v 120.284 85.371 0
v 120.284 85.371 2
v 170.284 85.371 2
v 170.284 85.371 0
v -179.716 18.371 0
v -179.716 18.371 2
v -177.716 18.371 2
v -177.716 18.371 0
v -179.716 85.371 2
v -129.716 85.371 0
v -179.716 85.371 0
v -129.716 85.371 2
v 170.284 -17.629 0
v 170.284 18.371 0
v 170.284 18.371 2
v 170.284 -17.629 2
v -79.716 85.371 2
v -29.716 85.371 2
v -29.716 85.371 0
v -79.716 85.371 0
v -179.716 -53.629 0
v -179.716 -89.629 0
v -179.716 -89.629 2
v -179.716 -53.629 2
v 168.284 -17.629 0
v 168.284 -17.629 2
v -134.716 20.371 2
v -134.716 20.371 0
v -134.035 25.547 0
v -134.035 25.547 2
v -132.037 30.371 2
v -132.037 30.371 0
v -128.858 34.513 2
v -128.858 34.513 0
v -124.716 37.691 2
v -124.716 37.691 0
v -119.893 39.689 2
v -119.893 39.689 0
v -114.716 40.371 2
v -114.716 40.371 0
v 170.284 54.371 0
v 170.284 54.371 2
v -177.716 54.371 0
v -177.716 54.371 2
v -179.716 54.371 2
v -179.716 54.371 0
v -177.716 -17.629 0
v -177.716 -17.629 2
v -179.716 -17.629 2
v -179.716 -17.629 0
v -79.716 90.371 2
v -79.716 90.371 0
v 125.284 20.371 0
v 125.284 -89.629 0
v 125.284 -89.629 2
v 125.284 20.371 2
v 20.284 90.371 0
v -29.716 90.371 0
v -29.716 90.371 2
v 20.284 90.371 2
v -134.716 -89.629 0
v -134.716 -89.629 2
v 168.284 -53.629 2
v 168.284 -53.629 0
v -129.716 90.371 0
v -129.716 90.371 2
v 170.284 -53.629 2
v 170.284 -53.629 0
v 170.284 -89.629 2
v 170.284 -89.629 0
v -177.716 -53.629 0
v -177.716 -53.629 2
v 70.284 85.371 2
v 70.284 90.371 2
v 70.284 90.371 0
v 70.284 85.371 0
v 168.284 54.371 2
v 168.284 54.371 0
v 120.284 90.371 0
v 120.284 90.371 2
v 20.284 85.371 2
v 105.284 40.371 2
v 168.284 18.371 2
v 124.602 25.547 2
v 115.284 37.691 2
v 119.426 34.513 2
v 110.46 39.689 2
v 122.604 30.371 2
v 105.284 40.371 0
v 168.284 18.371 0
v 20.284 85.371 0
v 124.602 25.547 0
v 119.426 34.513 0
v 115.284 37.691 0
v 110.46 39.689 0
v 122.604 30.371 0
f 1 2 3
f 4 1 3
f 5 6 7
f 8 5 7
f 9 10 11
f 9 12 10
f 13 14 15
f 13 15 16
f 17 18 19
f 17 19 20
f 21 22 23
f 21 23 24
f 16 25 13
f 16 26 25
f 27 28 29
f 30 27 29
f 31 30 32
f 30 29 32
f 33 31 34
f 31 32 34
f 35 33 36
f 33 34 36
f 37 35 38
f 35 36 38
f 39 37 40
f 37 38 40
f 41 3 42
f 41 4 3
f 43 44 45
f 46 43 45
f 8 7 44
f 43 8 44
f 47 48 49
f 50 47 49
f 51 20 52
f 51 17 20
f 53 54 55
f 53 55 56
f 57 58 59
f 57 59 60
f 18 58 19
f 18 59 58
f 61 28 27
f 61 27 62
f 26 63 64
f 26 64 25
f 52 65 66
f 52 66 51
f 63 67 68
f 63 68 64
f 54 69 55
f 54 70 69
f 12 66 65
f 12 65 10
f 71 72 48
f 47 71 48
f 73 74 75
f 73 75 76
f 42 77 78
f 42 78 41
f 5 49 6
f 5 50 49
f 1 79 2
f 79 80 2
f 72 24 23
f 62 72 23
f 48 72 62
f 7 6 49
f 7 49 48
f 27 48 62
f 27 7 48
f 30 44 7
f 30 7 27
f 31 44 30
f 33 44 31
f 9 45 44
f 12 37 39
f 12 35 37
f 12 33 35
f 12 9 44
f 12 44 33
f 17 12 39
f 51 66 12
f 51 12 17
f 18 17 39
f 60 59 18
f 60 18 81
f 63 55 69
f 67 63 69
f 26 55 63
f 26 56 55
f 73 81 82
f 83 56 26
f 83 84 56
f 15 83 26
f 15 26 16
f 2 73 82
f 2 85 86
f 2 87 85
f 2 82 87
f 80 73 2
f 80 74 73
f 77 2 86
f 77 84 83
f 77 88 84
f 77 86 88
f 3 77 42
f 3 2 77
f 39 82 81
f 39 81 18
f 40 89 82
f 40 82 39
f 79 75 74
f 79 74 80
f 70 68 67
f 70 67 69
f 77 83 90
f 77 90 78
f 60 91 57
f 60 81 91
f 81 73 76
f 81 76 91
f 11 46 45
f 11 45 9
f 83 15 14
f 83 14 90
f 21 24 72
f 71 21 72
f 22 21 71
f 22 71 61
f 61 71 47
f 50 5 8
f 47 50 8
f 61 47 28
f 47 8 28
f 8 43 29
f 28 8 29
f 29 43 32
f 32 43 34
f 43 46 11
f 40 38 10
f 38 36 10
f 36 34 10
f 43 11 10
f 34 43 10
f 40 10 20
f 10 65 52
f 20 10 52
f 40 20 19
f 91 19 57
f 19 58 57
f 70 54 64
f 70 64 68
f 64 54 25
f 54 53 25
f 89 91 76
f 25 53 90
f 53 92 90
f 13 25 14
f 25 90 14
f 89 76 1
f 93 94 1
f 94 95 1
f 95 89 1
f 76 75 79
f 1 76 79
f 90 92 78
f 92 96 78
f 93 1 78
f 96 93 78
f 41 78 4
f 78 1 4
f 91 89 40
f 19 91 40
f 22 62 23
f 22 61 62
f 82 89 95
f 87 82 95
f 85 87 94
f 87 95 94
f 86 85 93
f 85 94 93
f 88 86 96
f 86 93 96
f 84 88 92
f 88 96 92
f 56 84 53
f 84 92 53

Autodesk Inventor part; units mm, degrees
ref_plane "YZ Plane" through (0, 0, 0) normal (1, 0, 0) x (0, 1, 0)
ref_plane "XZ Plane" through (0, 0, 0) normal (0, 1, 0) x (-1, 0, 0)
ref_plane "XY Plane" through (0, 0, 0) normal (0, 0, 1) x (1, 0, 0)
sketch "Sketch1" plane through (0, 0, 0) normal (0, 0, 1) x (1, 0, 0)
  line L0 (-179.7163, 90.3709) -> (170.2837, 90.3709)
  line L1 (170.2837, 90.3709) -> (170.2837, -89.6291)
  line L2 (-179.7163, -89.6291) -> (-179.7163, 90.3709)
  line L3 (125.2837, -89.6291) -> (125.2837, 20.3709)
  line L4 (105.2837, 40.3709) -> (-114.7163, 40.3709)
  line L5 (-134.7163, 20.3709) -> (-134.7163, -89.6291)
  line L6 (170.2837, -89.6291) -> (125.2837, -89.6291)
  line L7 (-134.7163, -89.6291) -> (-179.7163, -89.6291)
  arc A0 (-114.7163, 40.3709) -> (-134.7163, 20.3709) centre (-114.7163, 20.3709) ccw
  arc A1 (125.2837, 20.3709) -> (105.2837, 40.3709) centre (105.2837, 20.3709) ccw
  point P0 (0, 0)
  dimension "d0" = 350
  dimension "d1" = 180
  dimension "d2" = 45
  dimension "d3" = 45
  dimension "d4" = 50
  dimension "d5" = 20
extrude "Extrusion1" add sketch "Sketch1" along normal blind 2
sketch "Sketch2" plane through (0, 0, 2) normal (0, 0, 1) x (1, 0, 0)
  line L0 (170.2837, 90.3709) -> (-179.7163, 90.3709) projected
  line L1 (-179.7163, 90.3709) -> (-129.7163, 90.3709)
  line L2 (-129.7163, 90.3709) -> (-129.7163, 85.3709)
  line L3 (-129.7163, 85.3709) -> (-179.7163, 85.3709)
  line L4 (-179.7163, 85.3709) -> (-179.7163, 90.3709)
  line L5 (-79.7163, 90.3709) -> (-29.7163, 90.3709)
  line L6 (-29.7163, 90.3709) -> (-29.7163, 85.3709)
  line L7 (-29.7163, 85.3709) -> (-79.7163, 85.3709)
  line L8 (-79.7163, 85.3709) -> (-79.7163, 90.3709)
  line L9 (20.2837, 90.3709) -> (70.2837, 90.3709)
  line L10 (70.2837, 90.3709) -> (70.2837, 85.3709)
  line L11 (70.2837, 85.3709) -> (20.2837, 85.3709)
  line L12 (20.2837, 85.3709) -> (20.2837, 90.3709)
  line L13 (170.2837, 90.3709) -> (120.2837, 90.3709)
  line L14 (120.2837, 90.3709) -> (120.2837, 85.3709)
  line L15 (120.2837, 85.3709) -> (170.2837, 85.3709)
  line L16 (170.2837, 85.3709) -> (170.2837, 90.3709)
  point P0 (0, 0)
  dimension "d8" = 50
  dimension "d9" = 50
  dimension "d10" = 50
  dimension "d11" = 50
  dimension "d12" = 50
  dimension "d13" = 50
  dimension "d14" = 50
  dimension "d15" = 5
extrude "Extrusion2" cut sketch "Sketch2" against normal blind 2
sketch "Sketch3" plane through (0, 0, 2) normal (0, 0, 1) x (1, 0, 0)
  line L0 (-179.7163, 85.3709) -> (-179.7163, -89.6291) projected
  line L1 (-179.7163, -53.6291) -> (-177.7163, -53.6291)
  line L2 (-177.7163, -53.6291) -> (-177.7163, -17.6291)
  line L3 (-177.7163, -17.6291) -> (-179.7163, -17.6291)
  line L4 (-179.7163, -17.6291) -> (-179.7163, -53.6291)
  line L5 (-179.7163, 18.3709) -> (-177.7163, 18.3709)
  line L6 (-177.7163, 18.3709) -> (-177.7163, 54.3709)
  line L7 (-177.7163, 54.3709) -> (-179.7163, 54.3709)
  line L8 (-179.7163, 54.3709) -> (-179.7163, 18.3709)
  line L9 (170.2837, -89.6291) -> (170.2837, 85.3709) projected
  line L10 (170.2837, -53.6291) -> (168.2837, -53.6291)
  line L11 (168.2837, -53.6291) -> (168.2837, -17.6291)
  line L12 (168.2837, -17.6291) -> (170.2837, -17.6291)
  line L13 (170.2837, -17.6291) -> (170.2837, -53.6291)
  line L14 (170.2837, 18.3709) -> (168.2837, 18.3709)
  line L15 (168.2837, 18.3709) -> (168.2837, 54.3709)
  line L16 (168.2837, 54.3709) -> (170.2837, 54.3709)
  line L17 (170.2837, 54.3709) -> (170.2837, 18.3709)
  line L18 (-179.7163, -89.6291) -> (-134.7163, -89.6291) projected
  line L19 (125.2837, -89.6291) -> (170.2837, -89.6291) projected
  point P0 (-177.7163, -35.6291)
  point P1 (-178.7163, -53.6291)
  point P2 (-178.7163, -17.6291)
  point P3 (-178.7163, 18.3709)
  point P4 (169.2837, -17.6291)
  point P5 (169.2837, 18.3709)
  point P6 (169.2837, -53.6291)
  dimension "d28" = 36
  dimension "d29" = 2
  dimension "d30" = 2
  dimension "d31" = 36
  dimension "d32" = 36
  dimension "d33" = 36
  dimension "d34" = 2
  dimension "d35" = 36
  dimension "d36" = 36
  dimension "d37" = 36
  dimension "d38" = 36
extrude "Extrusion3" cut sketch "Sketch3" against normal blind 2
properties part number "back"
